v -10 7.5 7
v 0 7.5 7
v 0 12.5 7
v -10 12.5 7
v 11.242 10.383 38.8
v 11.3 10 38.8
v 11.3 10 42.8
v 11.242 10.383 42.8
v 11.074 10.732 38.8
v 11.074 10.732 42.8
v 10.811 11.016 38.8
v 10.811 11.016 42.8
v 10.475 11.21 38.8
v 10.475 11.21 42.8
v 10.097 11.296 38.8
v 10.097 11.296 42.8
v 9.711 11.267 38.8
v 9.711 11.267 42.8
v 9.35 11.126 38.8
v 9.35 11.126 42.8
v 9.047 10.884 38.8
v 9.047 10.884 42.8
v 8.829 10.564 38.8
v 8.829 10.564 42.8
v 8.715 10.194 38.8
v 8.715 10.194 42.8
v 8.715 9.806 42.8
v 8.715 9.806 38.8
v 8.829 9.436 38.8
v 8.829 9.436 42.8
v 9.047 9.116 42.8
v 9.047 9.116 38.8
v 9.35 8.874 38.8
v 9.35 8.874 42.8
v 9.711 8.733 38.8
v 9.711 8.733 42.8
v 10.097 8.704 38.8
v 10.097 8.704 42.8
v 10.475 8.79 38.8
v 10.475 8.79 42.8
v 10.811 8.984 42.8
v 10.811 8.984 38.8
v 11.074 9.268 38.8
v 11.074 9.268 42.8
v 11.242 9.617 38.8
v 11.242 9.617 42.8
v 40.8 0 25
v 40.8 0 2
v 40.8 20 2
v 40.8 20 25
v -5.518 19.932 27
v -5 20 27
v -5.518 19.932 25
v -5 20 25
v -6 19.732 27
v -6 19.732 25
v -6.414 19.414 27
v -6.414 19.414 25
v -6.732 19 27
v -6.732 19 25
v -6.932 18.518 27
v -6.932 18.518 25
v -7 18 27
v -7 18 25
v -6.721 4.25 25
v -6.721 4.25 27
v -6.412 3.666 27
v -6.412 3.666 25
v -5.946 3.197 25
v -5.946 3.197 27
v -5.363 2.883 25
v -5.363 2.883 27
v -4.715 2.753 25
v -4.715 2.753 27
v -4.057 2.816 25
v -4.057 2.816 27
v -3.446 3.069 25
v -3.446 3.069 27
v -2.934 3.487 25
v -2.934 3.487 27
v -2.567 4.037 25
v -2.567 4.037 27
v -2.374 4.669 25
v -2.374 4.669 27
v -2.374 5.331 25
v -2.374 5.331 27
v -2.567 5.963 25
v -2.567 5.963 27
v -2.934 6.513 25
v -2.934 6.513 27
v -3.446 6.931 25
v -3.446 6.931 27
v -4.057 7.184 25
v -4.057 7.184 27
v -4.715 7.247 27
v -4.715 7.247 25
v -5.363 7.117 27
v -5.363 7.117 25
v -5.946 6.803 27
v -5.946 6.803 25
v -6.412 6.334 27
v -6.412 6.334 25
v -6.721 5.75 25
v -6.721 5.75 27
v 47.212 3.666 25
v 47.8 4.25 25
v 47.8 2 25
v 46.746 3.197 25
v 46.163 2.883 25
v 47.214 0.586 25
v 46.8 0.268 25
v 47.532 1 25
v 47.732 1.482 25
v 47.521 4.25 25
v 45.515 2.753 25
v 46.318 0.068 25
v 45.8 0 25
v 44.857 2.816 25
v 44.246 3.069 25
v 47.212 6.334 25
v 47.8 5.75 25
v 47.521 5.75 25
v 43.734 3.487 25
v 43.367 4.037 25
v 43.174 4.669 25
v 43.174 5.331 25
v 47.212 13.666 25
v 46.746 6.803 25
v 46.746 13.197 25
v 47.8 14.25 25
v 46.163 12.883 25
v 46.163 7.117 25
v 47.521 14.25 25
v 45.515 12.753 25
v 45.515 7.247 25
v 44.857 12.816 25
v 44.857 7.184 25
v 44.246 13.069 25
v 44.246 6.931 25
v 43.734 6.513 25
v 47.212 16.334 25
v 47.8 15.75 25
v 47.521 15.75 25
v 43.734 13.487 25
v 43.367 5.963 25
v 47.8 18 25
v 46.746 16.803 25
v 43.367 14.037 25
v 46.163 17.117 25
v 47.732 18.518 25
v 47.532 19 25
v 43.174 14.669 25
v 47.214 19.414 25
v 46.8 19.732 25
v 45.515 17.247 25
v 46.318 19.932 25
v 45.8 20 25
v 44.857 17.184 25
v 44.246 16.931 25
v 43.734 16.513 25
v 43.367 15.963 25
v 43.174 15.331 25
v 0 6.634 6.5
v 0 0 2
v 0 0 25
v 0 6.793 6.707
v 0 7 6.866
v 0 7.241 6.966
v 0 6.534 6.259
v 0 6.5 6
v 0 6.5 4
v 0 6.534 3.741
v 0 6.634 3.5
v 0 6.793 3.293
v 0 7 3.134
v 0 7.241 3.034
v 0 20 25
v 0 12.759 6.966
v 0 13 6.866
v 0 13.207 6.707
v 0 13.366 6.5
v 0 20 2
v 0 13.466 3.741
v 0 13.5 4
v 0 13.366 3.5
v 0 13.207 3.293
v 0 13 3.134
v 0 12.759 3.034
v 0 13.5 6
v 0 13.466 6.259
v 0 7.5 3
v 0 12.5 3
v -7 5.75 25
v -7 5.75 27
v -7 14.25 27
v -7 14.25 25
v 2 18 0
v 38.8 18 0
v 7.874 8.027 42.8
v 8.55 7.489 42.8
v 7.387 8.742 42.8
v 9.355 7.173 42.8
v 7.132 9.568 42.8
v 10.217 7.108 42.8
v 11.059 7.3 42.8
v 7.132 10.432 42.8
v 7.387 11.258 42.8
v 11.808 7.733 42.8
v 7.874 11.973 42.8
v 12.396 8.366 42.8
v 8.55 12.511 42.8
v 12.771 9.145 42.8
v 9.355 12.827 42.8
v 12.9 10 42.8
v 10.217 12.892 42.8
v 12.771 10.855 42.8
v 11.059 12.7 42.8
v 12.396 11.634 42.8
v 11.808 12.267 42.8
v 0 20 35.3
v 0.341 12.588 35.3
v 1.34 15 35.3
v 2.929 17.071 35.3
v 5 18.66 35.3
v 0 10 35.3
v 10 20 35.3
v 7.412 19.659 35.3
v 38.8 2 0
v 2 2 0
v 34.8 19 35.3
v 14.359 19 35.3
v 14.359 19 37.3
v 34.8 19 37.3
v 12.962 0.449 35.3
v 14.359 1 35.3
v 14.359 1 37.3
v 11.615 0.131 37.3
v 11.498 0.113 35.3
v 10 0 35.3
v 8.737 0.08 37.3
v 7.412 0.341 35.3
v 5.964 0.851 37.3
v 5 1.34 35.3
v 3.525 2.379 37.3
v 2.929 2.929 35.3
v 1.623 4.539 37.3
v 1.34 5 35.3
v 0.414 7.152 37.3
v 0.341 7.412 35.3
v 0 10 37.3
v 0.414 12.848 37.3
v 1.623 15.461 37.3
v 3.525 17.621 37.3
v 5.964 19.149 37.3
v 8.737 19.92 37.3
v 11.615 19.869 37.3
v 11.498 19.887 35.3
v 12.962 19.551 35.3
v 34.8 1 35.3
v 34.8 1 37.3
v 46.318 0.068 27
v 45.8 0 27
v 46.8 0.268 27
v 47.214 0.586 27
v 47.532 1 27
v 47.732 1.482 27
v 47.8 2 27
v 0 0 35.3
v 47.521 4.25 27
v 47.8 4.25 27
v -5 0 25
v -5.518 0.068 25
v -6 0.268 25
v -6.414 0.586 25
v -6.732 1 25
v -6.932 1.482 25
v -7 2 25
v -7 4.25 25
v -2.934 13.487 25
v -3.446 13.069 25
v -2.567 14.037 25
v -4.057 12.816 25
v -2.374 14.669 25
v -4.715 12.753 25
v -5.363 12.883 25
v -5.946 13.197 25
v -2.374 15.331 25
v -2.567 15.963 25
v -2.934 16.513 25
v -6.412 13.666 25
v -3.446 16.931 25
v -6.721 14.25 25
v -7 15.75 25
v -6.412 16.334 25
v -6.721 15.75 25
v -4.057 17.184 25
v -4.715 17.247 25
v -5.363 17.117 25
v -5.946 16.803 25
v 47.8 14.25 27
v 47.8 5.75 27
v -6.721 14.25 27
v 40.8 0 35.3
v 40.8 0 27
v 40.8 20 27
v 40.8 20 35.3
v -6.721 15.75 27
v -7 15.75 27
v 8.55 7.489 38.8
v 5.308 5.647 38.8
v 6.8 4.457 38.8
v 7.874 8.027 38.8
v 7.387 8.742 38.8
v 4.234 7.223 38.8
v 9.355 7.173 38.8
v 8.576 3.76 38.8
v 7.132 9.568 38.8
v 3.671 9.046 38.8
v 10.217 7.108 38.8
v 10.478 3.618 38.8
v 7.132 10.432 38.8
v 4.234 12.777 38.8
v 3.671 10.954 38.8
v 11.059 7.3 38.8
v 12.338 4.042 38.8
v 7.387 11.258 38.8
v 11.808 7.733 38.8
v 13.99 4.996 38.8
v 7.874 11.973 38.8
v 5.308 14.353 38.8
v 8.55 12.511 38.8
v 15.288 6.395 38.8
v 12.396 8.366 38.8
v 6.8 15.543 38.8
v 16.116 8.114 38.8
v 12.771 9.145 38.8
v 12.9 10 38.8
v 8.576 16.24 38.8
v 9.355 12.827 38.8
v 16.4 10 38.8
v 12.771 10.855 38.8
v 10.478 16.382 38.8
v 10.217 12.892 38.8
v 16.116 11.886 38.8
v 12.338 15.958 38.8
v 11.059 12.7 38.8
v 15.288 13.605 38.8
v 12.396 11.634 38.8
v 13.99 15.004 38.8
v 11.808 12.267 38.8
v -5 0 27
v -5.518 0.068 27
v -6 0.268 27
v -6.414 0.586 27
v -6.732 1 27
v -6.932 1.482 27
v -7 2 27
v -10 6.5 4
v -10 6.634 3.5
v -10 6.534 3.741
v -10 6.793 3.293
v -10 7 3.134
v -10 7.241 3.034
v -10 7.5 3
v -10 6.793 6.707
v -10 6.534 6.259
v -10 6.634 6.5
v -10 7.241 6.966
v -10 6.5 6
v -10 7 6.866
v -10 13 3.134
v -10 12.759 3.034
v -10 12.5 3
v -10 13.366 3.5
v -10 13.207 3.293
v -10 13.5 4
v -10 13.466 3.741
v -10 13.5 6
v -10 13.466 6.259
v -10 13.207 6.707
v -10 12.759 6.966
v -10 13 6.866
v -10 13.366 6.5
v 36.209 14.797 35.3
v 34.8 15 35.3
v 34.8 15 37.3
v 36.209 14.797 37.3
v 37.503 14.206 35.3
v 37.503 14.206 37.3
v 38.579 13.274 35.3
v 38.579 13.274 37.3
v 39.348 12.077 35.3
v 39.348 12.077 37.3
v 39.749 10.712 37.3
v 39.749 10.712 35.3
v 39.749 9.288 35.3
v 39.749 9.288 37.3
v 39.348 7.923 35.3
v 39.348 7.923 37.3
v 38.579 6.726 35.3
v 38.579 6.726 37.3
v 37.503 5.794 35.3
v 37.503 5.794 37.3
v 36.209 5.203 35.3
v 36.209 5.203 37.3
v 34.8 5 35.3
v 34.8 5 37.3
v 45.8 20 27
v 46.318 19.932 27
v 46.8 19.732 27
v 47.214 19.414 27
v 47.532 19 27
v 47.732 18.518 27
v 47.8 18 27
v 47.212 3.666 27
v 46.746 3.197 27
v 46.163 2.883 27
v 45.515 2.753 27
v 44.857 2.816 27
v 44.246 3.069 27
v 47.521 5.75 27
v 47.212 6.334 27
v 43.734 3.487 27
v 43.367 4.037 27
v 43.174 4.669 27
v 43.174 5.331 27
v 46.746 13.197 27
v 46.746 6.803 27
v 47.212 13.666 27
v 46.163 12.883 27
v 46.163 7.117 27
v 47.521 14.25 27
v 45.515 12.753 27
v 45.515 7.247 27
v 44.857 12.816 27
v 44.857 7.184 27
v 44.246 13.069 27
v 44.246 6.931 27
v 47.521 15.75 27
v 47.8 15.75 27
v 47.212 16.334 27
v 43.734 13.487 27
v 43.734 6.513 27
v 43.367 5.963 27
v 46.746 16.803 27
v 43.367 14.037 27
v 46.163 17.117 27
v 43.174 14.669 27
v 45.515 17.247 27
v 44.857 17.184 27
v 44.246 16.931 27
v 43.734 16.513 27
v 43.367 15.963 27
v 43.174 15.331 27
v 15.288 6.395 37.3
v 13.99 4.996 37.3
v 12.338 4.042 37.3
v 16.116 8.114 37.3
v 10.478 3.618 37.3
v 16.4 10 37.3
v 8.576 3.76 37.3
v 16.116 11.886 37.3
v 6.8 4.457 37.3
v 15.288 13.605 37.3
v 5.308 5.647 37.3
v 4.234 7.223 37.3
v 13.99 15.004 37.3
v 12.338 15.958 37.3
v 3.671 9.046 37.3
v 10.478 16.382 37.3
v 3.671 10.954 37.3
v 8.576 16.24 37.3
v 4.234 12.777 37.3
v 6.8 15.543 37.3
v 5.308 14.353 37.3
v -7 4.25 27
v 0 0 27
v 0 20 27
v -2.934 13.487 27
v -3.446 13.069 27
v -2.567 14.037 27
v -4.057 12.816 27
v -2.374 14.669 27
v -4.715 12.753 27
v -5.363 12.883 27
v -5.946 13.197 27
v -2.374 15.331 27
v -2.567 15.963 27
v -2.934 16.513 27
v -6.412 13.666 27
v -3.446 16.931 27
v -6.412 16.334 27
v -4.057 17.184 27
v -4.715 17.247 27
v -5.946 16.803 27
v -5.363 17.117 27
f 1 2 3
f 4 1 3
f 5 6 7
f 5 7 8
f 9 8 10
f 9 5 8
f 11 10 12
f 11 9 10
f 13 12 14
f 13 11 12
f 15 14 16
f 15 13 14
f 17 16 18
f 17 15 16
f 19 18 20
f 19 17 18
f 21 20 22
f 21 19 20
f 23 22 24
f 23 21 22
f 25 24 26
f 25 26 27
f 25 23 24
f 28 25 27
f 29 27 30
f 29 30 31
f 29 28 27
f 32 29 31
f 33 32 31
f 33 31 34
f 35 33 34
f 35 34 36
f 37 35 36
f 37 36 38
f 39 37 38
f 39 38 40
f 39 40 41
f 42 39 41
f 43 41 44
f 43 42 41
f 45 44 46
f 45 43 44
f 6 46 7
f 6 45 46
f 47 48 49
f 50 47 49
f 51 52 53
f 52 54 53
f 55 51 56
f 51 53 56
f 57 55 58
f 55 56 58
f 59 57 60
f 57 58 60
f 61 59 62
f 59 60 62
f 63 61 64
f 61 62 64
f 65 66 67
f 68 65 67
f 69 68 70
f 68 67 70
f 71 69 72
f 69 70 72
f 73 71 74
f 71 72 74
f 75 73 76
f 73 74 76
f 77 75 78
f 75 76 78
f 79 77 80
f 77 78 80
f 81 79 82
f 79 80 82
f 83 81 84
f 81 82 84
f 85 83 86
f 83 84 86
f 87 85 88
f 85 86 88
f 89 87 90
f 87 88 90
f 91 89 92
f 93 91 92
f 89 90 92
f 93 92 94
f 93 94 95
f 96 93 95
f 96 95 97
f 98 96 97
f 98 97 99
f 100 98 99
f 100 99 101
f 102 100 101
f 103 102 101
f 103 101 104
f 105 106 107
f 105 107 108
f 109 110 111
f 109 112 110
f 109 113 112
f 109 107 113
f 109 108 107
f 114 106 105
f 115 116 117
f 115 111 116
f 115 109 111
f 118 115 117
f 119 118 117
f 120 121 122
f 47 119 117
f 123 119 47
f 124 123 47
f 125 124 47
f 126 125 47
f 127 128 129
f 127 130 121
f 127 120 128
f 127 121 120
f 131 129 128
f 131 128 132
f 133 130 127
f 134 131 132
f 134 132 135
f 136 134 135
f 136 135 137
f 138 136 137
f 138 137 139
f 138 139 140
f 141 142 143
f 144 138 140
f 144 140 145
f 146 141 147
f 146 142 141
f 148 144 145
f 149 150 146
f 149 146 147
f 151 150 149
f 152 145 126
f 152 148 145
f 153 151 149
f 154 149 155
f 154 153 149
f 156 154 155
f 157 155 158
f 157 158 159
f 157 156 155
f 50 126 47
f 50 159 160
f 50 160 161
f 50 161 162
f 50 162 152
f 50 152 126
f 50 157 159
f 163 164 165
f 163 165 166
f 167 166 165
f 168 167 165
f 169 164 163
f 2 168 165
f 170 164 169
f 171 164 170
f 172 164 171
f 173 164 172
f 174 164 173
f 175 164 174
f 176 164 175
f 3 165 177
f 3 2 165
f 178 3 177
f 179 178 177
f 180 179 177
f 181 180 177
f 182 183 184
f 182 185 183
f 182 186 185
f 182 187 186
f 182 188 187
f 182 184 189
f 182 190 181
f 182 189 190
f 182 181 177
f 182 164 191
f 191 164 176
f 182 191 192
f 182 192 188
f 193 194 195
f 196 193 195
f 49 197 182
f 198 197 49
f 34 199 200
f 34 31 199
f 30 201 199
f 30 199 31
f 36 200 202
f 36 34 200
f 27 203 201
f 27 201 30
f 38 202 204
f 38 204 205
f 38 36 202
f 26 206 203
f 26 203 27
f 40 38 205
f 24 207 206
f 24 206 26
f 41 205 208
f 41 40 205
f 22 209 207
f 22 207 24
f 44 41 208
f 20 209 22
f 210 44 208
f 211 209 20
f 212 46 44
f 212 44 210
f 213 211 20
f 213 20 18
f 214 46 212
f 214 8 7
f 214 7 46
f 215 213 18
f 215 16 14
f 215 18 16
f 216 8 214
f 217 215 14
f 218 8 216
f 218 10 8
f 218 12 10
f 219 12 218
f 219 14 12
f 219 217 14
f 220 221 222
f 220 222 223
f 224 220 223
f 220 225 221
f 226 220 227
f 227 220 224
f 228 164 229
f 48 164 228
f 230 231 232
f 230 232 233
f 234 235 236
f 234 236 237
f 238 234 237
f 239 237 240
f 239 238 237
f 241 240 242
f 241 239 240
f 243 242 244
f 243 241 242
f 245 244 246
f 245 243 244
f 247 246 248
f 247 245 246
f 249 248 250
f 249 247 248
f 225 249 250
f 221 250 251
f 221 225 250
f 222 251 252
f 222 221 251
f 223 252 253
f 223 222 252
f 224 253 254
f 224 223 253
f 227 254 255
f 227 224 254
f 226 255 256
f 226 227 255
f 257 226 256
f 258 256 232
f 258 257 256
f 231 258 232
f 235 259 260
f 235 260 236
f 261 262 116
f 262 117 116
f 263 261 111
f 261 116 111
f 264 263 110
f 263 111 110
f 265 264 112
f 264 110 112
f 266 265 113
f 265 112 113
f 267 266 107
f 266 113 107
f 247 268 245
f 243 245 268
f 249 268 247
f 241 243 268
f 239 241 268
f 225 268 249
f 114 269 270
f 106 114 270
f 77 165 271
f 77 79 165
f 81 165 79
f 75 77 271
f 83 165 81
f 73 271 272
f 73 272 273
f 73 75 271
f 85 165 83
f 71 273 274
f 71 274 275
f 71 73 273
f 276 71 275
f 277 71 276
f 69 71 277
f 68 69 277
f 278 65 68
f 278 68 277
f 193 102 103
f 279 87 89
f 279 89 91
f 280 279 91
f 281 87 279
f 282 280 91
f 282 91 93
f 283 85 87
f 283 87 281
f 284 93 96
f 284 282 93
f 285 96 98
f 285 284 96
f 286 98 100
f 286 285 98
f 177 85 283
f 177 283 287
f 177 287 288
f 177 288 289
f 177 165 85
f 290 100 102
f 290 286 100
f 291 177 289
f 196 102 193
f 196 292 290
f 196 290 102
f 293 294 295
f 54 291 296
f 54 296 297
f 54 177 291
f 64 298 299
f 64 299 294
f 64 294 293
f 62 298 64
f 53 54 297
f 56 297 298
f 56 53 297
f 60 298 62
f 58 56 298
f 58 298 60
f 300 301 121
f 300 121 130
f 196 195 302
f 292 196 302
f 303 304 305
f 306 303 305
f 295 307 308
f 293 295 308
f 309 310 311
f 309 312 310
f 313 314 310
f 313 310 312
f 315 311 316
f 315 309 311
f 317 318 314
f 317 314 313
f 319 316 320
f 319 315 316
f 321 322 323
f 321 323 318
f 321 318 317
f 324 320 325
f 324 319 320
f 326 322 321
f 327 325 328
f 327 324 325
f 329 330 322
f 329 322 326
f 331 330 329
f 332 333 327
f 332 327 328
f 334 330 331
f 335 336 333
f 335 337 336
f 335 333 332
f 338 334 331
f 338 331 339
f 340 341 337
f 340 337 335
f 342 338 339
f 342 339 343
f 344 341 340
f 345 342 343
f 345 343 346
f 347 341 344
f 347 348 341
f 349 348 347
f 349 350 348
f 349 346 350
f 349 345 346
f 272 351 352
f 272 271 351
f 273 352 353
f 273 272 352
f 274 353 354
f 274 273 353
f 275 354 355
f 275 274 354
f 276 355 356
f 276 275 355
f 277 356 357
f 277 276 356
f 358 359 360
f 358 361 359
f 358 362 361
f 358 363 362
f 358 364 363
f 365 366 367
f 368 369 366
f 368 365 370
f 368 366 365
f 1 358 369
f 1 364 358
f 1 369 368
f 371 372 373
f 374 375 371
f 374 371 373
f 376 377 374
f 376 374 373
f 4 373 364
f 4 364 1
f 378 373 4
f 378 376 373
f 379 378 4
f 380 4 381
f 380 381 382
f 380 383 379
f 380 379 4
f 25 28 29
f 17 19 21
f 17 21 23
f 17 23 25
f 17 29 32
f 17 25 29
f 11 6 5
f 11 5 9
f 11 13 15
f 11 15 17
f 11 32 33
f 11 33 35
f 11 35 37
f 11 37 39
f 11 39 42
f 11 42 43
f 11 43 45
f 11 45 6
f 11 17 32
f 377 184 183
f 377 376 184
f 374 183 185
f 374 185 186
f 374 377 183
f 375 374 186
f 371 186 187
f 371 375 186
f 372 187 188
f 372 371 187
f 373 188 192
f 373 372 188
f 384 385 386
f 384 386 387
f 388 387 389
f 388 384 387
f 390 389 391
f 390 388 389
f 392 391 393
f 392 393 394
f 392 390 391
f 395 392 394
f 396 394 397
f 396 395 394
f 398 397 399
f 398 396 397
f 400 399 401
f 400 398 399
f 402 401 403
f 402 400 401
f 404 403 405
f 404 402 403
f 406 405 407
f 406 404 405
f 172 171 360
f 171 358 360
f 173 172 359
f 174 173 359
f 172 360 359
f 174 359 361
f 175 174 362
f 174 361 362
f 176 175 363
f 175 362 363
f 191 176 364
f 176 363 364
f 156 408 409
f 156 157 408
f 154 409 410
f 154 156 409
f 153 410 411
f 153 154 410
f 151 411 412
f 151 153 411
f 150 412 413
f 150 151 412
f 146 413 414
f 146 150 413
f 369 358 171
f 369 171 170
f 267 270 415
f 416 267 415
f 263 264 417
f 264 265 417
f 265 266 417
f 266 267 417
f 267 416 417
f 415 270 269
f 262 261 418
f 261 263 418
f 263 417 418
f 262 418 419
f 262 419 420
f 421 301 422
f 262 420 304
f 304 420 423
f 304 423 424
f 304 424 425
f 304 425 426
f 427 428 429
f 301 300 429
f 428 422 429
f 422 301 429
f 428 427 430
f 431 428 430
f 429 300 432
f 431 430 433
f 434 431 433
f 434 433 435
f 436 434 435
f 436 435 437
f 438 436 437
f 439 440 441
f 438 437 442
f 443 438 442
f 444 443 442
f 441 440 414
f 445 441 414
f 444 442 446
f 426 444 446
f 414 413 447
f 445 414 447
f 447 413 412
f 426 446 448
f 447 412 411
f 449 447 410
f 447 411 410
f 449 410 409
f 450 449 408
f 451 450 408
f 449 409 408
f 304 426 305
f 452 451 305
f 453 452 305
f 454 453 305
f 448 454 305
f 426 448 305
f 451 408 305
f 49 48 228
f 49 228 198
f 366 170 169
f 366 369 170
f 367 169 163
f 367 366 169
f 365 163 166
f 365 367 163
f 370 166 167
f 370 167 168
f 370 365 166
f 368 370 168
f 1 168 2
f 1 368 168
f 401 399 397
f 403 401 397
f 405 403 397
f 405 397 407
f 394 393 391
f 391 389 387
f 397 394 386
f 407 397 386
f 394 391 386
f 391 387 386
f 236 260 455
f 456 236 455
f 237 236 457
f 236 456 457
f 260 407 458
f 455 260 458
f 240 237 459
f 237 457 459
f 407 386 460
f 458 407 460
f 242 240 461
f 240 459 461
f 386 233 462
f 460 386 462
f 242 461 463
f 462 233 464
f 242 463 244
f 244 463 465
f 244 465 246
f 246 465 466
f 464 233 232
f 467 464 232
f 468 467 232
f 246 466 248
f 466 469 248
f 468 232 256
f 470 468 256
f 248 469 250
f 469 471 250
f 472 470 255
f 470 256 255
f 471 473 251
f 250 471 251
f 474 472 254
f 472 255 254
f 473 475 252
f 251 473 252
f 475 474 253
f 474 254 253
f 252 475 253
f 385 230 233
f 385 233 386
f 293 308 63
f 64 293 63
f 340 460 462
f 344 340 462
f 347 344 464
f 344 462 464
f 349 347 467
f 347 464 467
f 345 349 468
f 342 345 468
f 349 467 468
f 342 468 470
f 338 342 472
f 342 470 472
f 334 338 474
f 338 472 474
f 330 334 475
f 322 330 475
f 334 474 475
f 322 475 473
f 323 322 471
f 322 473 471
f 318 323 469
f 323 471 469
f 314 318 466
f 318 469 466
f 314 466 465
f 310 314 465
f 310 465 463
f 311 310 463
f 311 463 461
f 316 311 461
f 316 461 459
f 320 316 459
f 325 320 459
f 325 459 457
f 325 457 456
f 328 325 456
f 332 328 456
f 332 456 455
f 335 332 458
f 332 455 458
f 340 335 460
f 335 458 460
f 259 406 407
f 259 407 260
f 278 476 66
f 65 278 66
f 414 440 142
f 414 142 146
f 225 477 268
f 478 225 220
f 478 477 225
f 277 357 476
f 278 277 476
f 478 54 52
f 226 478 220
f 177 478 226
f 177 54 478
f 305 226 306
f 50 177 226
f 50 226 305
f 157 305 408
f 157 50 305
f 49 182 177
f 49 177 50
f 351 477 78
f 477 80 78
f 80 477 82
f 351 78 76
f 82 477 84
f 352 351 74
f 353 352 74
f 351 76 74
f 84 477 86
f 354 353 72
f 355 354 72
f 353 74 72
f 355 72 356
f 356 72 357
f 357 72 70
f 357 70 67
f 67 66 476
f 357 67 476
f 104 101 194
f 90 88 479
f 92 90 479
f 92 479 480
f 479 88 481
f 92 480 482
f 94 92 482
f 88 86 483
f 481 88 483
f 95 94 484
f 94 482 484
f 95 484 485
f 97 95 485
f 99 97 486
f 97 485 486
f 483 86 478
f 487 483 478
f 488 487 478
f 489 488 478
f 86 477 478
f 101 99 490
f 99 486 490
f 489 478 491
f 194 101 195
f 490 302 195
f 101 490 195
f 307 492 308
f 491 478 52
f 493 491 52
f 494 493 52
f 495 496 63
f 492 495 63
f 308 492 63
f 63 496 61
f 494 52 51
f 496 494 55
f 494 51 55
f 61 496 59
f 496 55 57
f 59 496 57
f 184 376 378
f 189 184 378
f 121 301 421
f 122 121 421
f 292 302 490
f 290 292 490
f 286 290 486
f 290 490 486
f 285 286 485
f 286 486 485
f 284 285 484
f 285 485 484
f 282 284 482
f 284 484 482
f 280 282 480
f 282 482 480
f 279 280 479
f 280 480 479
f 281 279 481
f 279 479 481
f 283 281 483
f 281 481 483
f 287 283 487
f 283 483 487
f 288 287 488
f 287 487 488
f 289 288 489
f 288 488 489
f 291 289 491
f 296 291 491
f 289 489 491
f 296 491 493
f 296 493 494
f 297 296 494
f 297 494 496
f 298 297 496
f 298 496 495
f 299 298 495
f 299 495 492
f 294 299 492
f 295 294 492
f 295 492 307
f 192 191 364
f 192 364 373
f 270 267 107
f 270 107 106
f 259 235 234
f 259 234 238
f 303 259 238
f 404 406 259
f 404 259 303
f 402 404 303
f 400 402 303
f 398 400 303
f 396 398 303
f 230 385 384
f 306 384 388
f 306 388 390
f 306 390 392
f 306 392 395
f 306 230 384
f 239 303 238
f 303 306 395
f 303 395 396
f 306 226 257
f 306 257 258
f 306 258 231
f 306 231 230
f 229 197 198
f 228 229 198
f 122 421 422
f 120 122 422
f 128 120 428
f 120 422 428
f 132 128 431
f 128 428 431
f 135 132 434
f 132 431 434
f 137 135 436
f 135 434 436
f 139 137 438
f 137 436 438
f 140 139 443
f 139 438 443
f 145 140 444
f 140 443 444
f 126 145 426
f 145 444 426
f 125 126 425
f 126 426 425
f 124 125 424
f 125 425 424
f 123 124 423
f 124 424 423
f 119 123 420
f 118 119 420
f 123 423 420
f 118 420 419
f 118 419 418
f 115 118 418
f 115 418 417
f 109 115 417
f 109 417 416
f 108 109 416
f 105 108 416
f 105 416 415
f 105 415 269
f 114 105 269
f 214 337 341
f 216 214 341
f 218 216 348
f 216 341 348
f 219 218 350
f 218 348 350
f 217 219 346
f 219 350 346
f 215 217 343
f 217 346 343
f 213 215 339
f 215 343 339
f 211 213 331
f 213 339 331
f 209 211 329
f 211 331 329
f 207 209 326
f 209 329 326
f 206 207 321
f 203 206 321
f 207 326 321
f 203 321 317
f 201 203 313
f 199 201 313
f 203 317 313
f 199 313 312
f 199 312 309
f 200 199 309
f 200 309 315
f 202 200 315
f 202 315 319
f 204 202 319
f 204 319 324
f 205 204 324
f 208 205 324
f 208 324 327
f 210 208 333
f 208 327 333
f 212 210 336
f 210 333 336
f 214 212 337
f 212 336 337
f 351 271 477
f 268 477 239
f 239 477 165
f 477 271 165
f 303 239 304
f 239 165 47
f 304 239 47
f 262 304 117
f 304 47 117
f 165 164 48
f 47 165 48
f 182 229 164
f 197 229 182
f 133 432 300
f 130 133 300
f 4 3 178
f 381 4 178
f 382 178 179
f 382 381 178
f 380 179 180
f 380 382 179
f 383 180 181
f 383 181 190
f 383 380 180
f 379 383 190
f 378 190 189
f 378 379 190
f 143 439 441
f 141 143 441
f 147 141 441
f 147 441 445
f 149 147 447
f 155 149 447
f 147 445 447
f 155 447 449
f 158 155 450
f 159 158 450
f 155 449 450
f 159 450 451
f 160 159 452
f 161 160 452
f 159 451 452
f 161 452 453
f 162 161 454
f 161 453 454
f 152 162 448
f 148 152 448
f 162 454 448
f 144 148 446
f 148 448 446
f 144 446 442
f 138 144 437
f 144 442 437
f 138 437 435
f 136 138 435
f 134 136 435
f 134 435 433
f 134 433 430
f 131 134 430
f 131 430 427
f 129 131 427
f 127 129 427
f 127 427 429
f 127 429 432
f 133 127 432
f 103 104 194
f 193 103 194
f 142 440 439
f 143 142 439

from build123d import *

# Parameters (mm, degrees)
ESQUISSE1_W             = 40.8
ESQUISSE1_H             = 20
BOSS_EXTRU_1_DEPTH      = 35.3
BOSS_EXTRU_2_DEPTH      = 2
ESQUISSE3_R             = 6.4
BOSS_EXTRU_3_DEPTH      = 1.5
ESQUISSE4_R             = 2.9
ESQUISSE4_R_2           = 1.3
BOSS_EXTRU_4_DEPTH      = 4
ESQUISSE5_W             = 7
ESQUISSE5_H             = 20
BOSS_EXTRU_5_DEPTH      = 2
ENL_V_MAT_EXTRU_1_DEPTH = 59.428075443
CONG_1_R                = 2
ESQUISSE7_W             = 4
ESQUISSE7_H             = 7
BOSS_EXTRU_6_DEPTH      = 10
CHANFREIN1_SIZE         = 2
CONG_2_R                = 1


with BuildPart() as part:
    # Esquisse1 → Boss.-Extru.1 (new body)
    with BuildSketch(Plane.XY):
        with Locations((20.4, 10)):
            Rectangle(ESQUISSE1_W, ESQUISSE1_H)
    extrude(amount=BOSS_EXTRU_1_DEPTH)

    # Esquisse2 → Boss.-Extru.2 (add)
    with BuildSketch(Plane.XY.offset(35.3)):
        with BuildLine():
            Line((14.358898944, 19), (34.8, 19))
            Line((34.8, 19), (34.8, 15))
            ThreePointArc((34.8, 15), (39.8, 10), (34.8, 5))
            Line((34.8, 5), (34.8, 1))
            Line((34.8, 1), (14.358898944, 1))
            ThreePointArc((14.358898944, 1), (0, 10), (14.358898944, 19))
        make_face()
    extrude(amount=BOSS_EXTRU_2_DEPTH)

    # Esquisse3 → Boss.-Extru.3 (add)
    with BuildSketch(Plane.XY.offset(37.3)):
        with Locations((10, 10)):
            Circle(ESQUISSE3_R)
    extrude(amount=BOSS_EXTRU_3_DEPTH)

    # Esquisse4 → Boss.-Extru.4 (add)
    with BuildSketch(Plane.XY.offset(38.8)):
        with Locations((10, 10)):
            Circle(ESQUISSE4_R)
        with Locations((10, 10)):
            Circle(ESQUISSE4_R_2, mode=Mode.SUBTRACT)
    extrude(amount=BOSS_EXTRU_4_DEPTH)

    # Esquisse5 → Boss.-Extru.5 (add)
    with BuildSketch(Plane(origin=(0, 0, 27), x_dir=(-1, 0, 0), z_dir=(0, 0, -1))):
        with Locations((-44.3, 10)):
            Rectangle(ESQUISSE5_W, ESQUISSE5_H)
        with Locations((3.5, 10)):
            Rectangle(ESQUISSE5_W, ESQUISSE5_H)
    extrude(amount=BOSS_EXTRU_5_DEPTH)

    # Esquisse6 → Enlèv. mat.-Extru.1 (cut, through all)
    with BuildSketch(Plane.XY.offset(27)):
        with BuildLine():
            Line((-6.721320344, 15.75), (-7, 15.75))
            Line((-7, 15.75), (-7, 14.25))
            Line((-7, 14.25), (-6.721320344, 14.25))
            ThreePointArc((-6.721320344, 14.25), (-2.35, 15), (-6.721320344, 15.75))
        make_face()
        with BuildLine():
            Line((47.521320344, 14.25), (47.8, 14.25))
            Line((47.8, 14.25), (47.8, 15.75))
            Line((47.8, 15.75), (47.521320344, 15.75))
            ThreePointArc((47.521320344, 15.75), (43.15, 15), (47.521320344, 14.25))
        make_face()
        with BuildLine():
            Line((47.521320344, 4.25), (47.8, 4.25))
            Line((47.8, 4.25), (47.8, 5.75))
            Line((47.8, 5.75), (47.521320344, 5.75))
            ThreePointArc((47.521320344, 5.75), (43.15, 5), (47.521320344, 4.25))
        make_face()
        with BuildLine():
            Line((-6.721320344, 5.75), (-7, 5.75))
            Line((-7, 5.75), (-7, 4.25))
            Line((-7, 4.25), (-6.721320344, 4.25))
            ThreePointArc((-6.721320344, 4.25), (-2.35, 5), (-6.721320344, 5.75))
        make_face()
    extrude(amount=-ENL_V_MAT_EXTRU_1_DEPTH, mode=Mode.SUBTRACT)

    # Congé1
    cong_1_edges = [part.edges().sort_by_distance(p)[0] for p in [
        (47.8, 20, 26),
        (47.8, 0, 26),
        (-7, 20, 26),
        (-7, 0, 26),
    ]]
    fillet(cong_1_edges, radius=CONG_1_R)

    # Esquisse7 → Boss.-Extru.6 (add)
    with BuildSketch(Plane.ZY):
        with Locations((5, 10)):
            Rectangle(ESQUISSE7_W, ESQUISSE7_H)
    extrude(amount=BOSS_EXTRU_6_DEPTH)

    # Chanfrein1
    chanfrein1_edges = [part.edges().sort_by_distance(p)[0] for p in [
        (20.4, 20, 0),
        (40.8, 10, 0),
        (20.4, 0, 0),
        (0, 10, 0),
    ]]
    chamfer(chanfrein1_edges, length=CHANFREIN1_SIZE)

    # Congé2
    cong_2_edges = [part.edges().sort_by_distance(p)[0] for p in [
        (-5, 6.5, 7),
        (-5, 13.5, 7),
        (-5, 13.5, 3),
        (-5, 6.5, 3),
    ]]
    fillet(cong_2_edges, radius=CONG_2_R)


solid = part.part
